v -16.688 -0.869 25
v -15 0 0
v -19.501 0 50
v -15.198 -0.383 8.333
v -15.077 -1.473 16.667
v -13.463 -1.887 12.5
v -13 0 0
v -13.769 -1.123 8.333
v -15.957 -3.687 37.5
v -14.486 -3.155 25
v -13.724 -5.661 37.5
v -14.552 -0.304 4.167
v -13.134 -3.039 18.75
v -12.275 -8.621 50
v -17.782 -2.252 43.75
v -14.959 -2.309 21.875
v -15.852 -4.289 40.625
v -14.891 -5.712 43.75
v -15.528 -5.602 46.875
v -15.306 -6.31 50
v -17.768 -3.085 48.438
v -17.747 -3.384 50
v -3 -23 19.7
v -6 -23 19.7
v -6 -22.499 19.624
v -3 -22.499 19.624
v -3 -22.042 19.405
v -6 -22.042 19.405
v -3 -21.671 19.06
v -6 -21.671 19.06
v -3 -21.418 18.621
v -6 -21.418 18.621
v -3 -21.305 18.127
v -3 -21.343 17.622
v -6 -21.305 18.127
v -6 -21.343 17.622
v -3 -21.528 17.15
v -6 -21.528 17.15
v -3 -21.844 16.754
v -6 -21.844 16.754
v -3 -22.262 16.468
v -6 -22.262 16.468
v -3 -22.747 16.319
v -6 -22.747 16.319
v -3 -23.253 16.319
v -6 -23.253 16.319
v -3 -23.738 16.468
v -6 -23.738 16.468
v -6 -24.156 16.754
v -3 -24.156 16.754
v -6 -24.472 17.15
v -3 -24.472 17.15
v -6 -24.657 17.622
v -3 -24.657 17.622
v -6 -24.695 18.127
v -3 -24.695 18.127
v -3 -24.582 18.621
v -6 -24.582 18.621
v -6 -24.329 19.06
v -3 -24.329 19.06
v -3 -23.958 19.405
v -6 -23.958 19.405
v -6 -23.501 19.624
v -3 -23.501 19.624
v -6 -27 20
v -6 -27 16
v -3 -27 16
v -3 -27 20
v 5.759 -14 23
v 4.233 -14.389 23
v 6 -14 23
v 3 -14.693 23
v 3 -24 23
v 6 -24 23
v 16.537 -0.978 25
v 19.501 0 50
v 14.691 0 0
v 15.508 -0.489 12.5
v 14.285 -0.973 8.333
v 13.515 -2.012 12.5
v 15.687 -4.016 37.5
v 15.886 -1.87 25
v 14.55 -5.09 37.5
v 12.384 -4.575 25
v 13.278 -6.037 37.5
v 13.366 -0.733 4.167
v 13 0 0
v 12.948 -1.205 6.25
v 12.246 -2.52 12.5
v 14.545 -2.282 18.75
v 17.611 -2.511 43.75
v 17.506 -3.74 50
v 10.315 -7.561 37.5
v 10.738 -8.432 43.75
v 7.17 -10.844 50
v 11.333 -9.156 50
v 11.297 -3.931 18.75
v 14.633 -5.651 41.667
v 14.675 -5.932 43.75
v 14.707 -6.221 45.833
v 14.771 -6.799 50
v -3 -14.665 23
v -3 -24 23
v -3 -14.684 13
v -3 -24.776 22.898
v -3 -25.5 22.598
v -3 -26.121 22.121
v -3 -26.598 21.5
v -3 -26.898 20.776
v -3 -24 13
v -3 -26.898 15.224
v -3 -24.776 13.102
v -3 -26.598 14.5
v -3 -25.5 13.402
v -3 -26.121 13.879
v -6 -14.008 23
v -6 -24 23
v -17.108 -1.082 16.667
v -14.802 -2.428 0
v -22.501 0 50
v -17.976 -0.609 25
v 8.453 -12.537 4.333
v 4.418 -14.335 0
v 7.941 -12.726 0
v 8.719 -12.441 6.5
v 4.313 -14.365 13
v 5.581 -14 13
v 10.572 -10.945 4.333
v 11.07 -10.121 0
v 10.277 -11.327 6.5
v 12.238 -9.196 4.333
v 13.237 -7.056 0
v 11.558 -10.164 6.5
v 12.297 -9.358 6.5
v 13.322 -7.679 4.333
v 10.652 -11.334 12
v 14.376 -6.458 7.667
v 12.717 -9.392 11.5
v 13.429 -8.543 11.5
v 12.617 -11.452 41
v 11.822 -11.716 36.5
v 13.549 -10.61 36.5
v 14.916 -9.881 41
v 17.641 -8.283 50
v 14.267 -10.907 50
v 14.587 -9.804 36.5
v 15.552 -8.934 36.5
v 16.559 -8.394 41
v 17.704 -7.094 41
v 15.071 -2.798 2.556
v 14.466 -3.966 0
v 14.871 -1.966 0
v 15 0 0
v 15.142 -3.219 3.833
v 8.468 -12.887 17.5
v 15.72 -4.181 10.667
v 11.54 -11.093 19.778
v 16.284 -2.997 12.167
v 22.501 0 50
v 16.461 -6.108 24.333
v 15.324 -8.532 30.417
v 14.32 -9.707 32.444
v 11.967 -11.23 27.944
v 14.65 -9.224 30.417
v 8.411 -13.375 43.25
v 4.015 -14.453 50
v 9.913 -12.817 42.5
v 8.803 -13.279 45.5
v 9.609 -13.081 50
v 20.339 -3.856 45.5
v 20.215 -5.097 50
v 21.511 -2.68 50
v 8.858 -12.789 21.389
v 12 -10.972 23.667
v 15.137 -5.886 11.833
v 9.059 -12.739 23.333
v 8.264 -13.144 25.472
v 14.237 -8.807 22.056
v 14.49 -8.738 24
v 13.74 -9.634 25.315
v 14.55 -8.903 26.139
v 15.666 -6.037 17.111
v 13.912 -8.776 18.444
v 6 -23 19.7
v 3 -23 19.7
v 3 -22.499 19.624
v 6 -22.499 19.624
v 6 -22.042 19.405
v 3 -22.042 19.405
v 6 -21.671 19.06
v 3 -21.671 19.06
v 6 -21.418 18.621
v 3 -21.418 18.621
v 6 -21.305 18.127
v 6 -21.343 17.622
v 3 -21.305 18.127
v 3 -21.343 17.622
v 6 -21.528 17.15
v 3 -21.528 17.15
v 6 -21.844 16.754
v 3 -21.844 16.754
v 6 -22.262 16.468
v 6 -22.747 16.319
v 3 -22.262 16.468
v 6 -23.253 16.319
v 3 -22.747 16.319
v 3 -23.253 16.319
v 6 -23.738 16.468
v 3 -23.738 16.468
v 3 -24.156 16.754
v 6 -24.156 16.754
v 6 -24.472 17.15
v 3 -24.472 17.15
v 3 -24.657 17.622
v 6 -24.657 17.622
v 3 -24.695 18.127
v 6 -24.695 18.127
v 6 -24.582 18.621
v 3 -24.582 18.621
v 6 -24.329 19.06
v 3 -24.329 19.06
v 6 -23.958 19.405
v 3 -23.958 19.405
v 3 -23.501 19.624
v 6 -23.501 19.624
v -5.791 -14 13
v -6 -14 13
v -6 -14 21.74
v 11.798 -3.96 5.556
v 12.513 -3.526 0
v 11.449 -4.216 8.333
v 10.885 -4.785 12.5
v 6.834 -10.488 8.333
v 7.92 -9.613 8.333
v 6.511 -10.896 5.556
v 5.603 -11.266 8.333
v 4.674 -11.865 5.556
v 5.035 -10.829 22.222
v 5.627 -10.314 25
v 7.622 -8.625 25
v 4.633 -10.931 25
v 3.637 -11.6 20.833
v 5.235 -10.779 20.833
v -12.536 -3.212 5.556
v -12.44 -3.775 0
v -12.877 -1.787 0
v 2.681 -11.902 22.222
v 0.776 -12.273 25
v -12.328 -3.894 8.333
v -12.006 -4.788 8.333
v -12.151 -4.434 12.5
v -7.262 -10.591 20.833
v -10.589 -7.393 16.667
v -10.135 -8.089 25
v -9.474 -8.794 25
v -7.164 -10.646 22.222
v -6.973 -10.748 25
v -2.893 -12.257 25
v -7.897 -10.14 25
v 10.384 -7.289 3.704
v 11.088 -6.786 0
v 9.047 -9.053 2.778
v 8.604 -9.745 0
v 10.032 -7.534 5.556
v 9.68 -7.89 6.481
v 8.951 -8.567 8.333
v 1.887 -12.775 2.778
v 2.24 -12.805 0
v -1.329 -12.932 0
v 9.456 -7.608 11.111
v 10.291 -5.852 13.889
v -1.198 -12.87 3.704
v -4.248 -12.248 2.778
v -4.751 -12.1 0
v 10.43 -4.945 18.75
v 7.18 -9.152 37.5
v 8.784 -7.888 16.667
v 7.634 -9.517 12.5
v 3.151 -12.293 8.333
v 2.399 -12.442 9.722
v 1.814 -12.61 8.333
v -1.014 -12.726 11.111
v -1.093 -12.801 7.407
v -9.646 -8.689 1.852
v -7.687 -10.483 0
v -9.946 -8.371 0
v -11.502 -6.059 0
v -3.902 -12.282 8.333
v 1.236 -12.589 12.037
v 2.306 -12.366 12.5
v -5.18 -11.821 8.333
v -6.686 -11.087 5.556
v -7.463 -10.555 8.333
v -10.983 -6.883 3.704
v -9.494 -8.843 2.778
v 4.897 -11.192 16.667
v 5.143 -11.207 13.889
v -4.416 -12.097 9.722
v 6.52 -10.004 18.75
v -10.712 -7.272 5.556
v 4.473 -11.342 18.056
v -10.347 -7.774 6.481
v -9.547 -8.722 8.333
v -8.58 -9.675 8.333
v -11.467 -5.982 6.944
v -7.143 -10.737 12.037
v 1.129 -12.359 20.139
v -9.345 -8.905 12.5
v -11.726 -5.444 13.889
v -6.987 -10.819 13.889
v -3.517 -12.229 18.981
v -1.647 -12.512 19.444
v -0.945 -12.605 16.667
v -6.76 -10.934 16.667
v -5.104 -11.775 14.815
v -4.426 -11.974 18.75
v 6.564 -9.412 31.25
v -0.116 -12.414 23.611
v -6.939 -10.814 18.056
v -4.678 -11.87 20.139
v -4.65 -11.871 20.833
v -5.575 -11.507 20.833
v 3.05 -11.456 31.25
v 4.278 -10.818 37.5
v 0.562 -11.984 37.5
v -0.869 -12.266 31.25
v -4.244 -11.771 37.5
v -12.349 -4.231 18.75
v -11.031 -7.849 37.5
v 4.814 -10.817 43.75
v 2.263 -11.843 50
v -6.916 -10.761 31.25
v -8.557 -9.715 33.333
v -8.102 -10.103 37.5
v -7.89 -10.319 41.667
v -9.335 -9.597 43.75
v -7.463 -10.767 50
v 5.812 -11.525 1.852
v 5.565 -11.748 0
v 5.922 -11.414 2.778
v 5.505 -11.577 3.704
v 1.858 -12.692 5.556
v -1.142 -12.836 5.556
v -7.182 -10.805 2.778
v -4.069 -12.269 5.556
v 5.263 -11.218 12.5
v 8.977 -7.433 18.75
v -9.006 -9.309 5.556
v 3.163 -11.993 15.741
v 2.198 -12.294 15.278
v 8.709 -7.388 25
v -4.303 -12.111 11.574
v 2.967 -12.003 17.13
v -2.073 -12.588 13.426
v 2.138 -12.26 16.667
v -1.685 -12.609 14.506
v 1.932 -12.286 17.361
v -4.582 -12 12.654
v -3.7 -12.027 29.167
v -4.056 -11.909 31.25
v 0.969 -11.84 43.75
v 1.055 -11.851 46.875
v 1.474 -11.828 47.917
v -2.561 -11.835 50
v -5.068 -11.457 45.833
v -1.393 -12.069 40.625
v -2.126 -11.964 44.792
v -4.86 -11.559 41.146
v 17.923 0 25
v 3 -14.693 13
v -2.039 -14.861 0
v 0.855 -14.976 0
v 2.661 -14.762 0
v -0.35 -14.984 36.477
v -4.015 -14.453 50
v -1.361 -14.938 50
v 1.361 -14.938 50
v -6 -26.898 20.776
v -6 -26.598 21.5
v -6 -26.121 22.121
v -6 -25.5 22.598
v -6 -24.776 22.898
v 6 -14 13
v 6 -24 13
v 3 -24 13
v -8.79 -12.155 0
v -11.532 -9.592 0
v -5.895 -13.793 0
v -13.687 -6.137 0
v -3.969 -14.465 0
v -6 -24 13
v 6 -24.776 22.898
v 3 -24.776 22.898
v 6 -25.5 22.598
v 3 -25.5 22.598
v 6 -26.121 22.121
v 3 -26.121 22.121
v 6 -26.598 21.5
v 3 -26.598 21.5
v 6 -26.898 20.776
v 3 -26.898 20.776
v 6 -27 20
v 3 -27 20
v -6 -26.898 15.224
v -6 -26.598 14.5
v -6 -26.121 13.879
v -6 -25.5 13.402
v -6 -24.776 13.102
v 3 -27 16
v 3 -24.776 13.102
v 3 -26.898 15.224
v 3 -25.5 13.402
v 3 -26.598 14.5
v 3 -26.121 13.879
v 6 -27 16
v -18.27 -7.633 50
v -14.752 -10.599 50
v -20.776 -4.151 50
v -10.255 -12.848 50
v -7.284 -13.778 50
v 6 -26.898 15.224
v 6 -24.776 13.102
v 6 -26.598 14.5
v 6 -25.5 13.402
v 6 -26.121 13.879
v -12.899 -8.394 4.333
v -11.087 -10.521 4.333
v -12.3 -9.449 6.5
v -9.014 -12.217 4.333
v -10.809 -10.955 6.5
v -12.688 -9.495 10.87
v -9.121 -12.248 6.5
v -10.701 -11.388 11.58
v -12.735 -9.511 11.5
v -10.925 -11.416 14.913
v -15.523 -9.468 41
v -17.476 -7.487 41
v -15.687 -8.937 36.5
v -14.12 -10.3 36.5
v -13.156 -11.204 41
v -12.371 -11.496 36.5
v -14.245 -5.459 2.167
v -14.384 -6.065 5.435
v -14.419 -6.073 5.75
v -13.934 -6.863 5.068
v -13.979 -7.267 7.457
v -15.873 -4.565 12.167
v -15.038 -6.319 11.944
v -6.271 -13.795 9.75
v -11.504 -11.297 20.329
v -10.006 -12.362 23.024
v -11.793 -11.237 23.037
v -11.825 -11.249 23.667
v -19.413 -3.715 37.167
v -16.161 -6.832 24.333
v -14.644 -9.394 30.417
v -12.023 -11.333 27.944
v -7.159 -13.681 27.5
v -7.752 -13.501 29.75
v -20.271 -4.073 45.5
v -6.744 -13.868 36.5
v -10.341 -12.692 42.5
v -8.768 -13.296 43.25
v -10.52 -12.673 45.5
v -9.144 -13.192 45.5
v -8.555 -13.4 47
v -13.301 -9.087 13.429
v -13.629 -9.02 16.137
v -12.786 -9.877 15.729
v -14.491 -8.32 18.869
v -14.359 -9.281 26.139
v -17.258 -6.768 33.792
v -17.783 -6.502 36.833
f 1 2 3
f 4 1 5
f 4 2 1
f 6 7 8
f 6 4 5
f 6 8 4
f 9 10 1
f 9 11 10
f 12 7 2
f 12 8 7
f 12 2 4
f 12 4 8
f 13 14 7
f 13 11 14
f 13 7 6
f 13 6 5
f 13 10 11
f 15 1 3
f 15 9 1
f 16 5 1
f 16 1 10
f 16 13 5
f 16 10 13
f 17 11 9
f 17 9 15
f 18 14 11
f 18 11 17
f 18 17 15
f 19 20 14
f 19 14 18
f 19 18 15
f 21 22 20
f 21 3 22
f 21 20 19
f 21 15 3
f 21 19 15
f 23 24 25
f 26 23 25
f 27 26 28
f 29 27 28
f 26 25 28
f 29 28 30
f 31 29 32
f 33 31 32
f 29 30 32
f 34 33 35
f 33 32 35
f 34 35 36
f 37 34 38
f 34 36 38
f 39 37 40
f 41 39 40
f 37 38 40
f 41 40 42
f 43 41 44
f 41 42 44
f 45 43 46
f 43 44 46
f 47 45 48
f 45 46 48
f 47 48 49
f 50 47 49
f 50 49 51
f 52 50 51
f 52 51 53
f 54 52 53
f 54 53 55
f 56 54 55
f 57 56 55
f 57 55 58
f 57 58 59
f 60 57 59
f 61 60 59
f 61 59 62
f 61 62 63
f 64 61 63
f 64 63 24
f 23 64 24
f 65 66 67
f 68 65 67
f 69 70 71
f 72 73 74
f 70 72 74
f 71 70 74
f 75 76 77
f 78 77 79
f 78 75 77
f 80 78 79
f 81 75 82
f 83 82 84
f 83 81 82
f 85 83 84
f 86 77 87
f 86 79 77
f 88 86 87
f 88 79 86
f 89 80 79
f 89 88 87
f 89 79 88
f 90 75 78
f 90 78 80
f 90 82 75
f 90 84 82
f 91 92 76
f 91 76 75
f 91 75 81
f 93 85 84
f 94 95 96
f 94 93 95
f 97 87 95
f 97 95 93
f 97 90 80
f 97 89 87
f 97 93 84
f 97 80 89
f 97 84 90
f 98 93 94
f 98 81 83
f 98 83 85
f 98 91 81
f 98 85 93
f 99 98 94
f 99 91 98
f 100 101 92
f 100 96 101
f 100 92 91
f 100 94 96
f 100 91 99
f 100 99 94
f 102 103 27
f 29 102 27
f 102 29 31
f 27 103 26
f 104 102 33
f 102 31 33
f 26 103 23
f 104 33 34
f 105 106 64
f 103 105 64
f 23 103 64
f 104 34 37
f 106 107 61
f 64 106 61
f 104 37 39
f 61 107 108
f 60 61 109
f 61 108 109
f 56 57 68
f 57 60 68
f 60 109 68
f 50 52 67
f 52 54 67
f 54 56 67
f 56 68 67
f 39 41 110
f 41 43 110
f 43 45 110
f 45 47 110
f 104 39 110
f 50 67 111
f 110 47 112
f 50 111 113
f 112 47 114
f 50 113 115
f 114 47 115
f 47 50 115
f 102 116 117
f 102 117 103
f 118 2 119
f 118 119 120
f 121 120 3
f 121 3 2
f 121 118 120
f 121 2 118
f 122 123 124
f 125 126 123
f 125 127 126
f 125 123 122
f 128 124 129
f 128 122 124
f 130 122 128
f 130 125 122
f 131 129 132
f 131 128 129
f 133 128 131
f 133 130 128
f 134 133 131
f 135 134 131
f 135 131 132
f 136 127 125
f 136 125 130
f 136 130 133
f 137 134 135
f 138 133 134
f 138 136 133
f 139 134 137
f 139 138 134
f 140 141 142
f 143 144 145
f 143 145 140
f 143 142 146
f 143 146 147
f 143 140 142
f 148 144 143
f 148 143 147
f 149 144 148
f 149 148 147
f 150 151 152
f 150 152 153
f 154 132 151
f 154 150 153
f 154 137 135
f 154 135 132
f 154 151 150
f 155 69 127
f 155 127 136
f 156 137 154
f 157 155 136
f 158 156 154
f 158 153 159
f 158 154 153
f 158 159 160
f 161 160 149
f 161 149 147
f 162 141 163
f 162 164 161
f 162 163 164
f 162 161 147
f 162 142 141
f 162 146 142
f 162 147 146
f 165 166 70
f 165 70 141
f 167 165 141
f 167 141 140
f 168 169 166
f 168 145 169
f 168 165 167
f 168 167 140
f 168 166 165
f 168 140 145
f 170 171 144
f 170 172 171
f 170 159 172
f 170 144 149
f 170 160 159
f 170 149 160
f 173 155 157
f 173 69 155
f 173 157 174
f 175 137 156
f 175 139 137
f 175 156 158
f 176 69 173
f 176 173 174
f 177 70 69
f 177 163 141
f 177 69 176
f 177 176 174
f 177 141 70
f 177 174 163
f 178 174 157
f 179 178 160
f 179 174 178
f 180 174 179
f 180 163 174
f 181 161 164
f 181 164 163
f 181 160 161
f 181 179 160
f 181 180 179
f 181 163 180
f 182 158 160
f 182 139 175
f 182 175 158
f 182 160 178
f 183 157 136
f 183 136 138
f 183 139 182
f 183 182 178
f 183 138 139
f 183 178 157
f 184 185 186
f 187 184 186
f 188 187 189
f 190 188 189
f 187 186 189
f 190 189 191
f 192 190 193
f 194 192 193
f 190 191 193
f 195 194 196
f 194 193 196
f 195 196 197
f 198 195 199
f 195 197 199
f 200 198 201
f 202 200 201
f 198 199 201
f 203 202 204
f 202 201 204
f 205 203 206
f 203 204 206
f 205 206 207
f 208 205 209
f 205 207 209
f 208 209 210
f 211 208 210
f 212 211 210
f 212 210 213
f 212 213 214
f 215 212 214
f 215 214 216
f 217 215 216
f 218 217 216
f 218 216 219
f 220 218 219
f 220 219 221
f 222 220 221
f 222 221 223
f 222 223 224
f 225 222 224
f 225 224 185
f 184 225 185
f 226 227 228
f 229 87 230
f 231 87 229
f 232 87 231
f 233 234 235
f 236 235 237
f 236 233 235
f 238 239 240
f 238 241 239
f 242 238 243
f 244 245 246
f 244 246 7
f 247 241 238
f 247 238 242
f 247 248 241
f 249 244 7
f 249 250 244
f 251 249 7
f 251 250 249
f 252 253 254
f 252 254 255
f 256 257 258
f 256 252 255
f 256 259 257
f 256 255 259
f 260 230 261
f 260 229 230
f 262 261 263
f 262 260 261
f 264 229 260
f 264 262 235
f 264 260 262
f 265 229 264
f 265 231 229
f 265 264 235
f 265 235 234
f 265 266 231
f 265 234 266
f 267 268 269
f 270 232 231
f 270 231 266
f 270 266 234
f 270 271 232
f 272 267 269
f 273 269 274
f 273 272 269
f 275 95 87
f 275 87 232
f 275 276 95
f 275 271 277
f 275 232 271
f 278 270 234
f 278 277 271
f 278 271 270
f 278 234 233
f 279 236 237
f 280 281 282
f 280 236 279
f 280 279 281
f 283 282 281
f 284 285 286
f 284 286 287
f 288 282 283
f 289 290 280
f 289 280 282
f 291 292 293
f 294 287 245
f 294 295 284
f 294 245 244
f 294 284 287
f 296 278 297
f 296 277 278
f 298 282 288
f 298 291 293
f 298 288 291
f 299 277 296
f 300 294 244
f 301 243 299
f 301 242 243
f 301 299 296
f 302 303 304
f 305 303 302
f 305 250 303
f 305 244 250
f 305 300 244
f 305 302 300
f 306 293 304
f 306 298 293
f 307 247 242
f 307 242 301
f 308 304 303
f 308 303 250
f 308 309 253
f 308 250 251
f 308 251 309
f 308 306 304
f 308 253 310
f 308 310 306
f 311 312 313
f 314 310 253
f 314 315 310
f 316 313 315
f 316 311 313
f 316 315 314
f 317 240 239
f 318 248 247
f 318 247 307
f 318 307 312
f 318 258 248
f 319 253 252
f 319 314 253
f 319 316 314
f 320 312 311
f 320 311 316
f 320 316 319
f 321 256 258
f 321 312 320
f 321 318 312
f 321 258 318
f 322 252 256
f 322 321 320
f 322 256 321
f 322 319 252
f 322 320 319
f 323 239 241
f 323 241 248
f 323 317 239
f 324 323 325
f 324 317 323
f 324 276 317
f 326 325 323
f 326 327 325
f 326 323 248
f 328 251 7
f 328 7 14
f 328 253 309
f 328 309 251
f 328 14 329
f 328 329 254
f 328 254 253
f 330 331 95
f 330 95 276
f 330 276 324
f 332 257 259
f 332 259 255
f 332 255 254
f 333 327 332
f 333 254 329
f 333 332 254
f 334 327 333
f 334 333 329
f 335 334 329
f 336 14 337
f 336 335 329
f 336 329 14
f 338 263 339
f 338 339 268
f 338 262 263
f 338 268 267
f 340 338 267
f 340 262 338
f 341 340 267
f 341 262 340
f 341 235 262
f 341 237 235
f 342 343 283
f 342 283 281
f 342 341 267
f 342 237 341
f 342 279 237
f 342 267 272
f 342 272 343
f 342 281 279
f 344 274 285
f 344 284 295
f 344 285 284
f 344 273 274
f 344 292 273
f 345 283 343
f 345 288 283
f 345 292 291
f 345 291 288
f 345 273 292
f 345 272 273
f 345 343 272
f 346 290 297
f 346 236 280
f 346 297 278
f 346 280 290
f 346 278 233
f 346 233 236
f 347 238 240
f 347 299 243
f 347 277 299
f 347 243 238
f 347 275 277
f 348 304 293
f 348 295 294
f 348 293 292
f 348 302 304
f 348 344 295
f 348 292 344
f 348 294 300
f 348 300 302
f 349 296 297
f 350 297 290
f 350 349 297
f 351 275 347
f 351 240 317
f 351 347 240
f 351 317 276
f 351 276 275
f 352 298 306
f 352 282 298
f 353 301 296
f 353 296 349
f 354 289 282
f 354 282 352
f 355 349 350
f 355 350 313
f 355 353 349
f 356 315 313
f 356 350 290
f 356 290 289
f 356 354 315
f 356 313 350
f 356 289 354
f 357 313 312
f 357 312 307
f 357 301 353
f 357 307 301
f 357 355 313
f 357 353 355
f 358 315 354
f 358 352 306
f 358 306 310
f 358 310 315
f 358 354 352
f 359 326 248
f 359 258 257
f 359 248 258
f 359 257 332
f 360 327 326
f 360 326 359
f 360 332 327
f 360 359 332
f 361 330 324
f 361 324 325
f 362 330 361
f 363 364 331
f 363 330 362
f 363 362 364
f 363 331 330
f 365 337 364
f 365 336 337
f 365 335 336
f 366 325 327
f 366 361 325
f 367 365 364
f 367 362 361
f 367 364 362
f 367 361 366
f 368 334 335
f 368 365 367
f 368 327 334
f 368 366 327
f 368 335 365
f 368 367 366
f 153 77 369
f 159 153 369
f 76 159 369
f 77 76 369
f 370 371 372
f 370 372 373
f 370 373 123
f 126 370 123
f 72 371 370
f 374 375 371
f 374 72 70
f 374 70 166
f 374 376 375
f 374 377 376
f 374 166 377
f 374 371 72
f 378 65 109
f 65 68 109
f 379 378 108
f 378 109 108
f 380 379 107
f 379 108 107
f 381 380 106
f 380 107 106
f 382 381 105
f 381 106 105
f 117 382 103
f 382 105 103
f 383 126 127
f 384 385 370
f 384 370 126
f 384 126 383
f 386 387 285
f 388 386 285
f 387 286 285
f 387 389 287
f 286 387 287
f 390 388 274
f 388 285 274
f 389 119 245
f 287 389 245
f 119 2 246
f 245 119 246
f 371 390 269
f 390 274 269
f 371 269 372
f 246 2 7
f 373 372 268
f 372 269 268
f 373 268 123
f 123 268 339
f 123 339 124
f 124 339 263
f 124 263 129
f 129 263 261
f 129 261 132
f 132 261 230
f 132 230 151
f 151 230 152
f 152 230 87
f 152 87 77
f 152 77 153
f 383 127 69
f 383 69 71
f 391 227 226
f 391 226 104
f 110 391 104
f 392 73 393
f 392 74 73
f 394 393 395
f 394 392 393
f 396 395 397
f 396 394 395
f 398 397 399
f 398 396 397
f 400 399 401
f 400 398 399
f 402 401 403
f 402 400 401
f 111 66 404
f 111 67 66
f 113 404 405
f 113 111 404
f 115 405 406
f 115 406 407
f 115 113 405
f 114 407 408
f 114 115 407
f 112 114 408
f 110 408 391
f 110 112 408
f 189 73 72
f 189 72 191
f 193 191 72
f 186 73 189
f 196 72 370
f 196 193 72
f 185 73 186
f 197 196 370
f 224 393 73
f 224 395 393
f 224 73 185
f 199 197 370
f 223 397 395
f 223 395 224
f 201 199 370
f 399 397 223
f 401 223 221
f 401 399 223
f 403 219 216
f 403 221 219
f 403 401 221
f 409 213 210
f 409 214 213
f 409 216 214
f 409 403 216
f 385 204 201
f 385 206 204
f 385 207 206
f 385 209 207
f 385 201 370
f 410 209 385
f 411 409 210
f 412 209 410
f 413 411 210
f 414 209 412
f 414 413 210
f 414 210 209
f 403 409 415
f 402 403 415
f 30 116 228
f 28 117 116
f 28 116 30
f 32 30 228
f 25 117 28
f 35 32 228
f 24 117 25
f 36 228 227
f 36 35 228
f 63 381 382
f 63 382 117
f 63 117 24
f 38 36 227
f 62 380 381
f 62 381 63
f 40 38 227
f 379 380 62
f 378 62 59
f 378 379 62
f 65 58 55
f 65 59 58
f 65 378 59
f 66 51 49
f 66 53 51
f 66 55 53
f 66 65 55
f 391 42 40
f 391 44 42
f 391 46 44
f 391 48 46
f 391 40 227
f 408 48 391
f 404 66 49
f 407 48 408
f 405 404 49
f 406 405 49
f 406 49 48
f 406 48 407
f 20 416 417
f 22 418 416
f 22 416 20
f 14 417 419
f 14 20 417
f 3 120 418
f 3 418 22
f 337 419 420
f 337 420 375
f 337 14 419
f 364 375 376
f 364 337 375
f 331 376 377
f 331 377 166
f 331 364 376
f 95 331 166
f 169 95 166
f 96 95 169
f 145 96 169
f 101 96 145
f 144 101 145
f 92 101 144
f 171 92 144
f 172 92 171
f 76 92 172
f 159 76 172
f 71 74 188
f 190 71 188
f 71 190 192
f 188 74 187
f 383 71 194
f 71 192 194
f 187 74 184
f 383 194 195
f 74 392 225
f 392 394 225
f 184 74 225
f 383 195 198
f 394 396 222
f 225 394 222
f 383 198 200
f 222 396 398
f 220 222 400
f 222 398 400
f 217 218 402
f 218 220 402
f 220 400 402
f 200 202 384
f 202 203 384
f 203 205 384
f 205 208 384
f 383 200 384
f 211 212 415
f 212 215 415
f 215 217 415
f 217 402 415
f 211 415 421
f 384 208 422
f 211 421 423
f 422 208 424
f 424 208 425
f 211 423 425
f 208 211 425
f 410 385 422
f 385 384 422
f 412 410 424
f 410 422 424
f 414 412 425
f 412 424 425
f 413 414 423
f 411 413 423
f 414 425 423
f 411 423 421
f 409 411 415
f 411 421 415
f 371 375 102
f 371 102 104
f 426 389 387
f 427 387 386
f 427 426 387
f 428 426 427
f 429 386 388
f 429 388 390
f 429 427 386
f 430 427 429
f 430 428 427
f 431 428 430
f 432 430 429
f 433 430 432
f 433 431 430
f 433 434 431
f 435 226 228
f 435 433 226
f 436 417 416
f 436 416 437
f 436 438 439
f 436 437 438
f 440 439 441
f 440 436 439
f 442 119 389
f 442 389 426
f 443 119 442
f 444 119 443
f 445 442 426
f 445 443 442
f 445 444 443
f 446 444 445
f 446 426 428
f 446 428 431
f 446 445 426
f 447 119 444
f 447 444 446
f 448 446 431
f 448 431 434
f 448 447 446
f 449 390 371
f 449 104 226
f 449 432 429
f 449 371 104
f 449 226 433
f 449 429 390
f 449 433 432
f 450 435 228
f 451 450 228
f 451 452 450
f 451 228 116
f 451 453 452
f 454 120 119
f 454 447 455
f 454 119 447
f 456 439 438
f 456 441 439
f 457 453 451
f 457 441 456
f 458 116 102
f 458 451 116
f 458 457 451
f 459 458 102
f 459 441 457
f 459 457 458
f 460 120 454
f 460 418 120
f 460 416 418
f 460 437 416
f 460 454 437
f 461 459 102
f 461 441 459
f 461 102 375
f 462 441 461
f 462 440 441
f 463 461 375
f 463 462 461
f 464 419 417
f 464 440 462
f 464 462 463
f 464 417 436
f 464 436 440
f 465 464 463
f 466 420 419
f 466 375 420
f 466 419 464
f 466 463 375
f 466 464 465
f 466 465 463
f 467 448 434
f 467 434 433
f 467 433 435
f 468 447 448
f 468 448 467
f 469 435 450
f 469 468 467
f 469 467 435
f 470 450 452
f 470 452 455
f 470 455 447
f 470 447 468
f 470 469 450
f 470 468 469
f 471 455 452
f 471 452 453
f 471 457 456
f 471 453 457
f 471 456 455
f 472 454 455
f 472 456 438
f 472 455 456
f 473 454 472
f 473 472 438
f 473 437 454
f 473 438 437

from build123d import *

# Parameters (mm, degrees)
Y_KSEKLIK_EKSTR_ZYON1_DEPTH      = 1
Y_KSEKLIK_EKSTR_ZYON1_DEPTH_BACK = 12
IZIM3_W                          = 3
IZIM3_H                          = 10
RADYUS1_R                        = 3
IZIM4_R                          = 1.7
KES_EKSTR_ZYON1_DEPTH            = 31


with BuildPart() as part:
    # Loft1: read off the stored shape, not the designer's step
    # Loft1: loft between two sections, ruled curve by curve
    loft1_from = [
        Edge.make_bspline([(-13, 0, 0), (-13.209224756, 0, 0), (-13.54255809, 0, 0), (-13.875891423, 0, 0), (-14.101661333, 0, 0), (-14.434994666, 0, 0), (-14.768328, 0, 0), (-15, 0, 0)], [0, 0, 0, 0, 0.313837134, 0.5, 0.5, 0.652492, 1, 1, 1, 1], 3),
        Edge.make_bspline([(-15, 0, 0), (-15, -0.406070992, 0), (-14.983401695, -0.812808246, 0), (-14.917335296, -1.623604412, 0), (-14.867867201, -2.027663325, 0), (-14.80212762, -2.428377634, 0)], [0, 0, 0, 0, 0.5, 0.5, 1, 1, 1, 1], 3),
        Edge.make_bspline([(13, 0, 0), (13, -0.541666667, 0), (12.966403007, -1.117524212, 0), (12.803508497, -2.333803221, 0), (12.674133333, -2.9744, 0), (12.285866667, -4.3056, 0), (12.026764297, -4.996380928, 0), (11.344022219, -6.396877499, 0), (10.92, -7.106666667, 0), (9.88, -8.493333333, 0), (9.263526615, -9.170013136, 0), (7.832363796, -10.41902796, 0), (7.017301038, -10.99077278, 0), (5.21799308, -11.950403691, 0), (4.233846154, -12.337435897, 0), (2.166153846, -12.862564103, 0), (1.083333333, -13, 0), (-1.083333333, -13, 0), (-2.166153846, -12.862564103, 0), (-4.233846154, -12.337435897, 0), (-5.21799308, -11.950403691, 0), (-7.017301038, -10.99077278, 0), (-7.832363796, -10.41902796, 0), (-9.263526615, -9.170013136, 0), (-9.88, -8.493333333, 0), (-10.92, -7.106666667, 0), (-11.344022219, -6.396877499, 0), (-12.026764297, -4.996380928, 0), (-12.285866667, -4.3056, 0), (-12.674133333, -2.9744, 0), (-12.803508497, -2.333803221, 0), (-12.966403007, -1.117524212, 0), (-13, -0.541666667, 0), (-13, 0, 0)], [0, 0, 0, 0, 0.0625, 0.0625, 0.125, 0.125, 0.1875, 0.1875, 0.25, 0.25, 0.3125, 0.3125, 0.375, 0.375, 0.4375, 0.4375, 0.5, 0.5, 0.5625, 0.5625, 0.625, 0.625, 0.6875, 0.6875, 0.75, 0.75, 0.8125, 0.8125, 0.875, 0.875, 0.9375, 0.9375, 1, 1, 1, 1], 3),
        Edge.make_bspline([(-14.80212762, -2.428377634, 0), (-14.681938937, -3.16098536, 0), (-14.504127476, -3.902792163, 0), (-14.02427913, -5.377833707, 0), (-13.722166884, -6.11096882, 0), (-12.993207628, -7.537795397, 0), (-12.566336555, -8.231351462, 0), (-11.597614897, -9.547946899, 0), (-11.055808561, -10.170847244, 0), (-9.876980677, -11.319111684, 0), (-9.240065749, -11.844371923, 0), (-7.898482942, -12.778181737, 0), (-7.193955206, -13.18669073, 0), (-5.748476154, -13.877925848, 0), (-5.007659558, -14.160679583, 0), (-3.520524561, -14.601623448, 0), (-2.774303774, -14.75989153, 0), (-2.038792236, -14.860798304, 0)], [0, 0, 0, 0, 0.125, 0.125, 0.25, 0.25, 0.375, 0.375, 0.5, 0.5, 0.625, 0.625, 0.75, 0.75, 0.875, 0.875, 1, 1, 1, 1], 3),
        Edge.make_bspline([(-2.038792236, -14.860798304, 0), (0.134662487, -15.158980307, 0), (2.321229161, -14.980811498, 0), (4.417739539, -14.33469837, 0)], [0, 0, 0, 0, 1, 1, 1, 1], 3, [1, 0.984272414, 0.984272414, 1]),
        Edge.make_bspline([(4.417739539, -14.33469837, 0), (5.127212599, -14.116049389, 0), (5.83796731, -13.839062041, 0), (7.234099562, -13.16317986, 0), (7.919368159, -12.764223905, 0), (9.233873859, -11.848095943, 0), (9.86297355, -11.3309185, 0), (11.035682686, -10.192235719, 0), (11.579160408, -9.570793115, 0), (12.556543149, -8.246833378, 0), (12.990359766, -7.544435992, 0), (13.733156479, -6.088380279, 0), (14.042115417, -5.334866309, 0), (14.53046703, -3.808849147, 0), (14.70990537, -3.036475671, 0), (14.944626607, -1.503208594, 0), (15, -0.742401104, 0), (15, 0, 0)], [0, 0, 0, 0, 0.125, 0.125, 0.25, 0.25, 0.375, 0.375, 0.5, 0.5, 0.625, 0.625, 0.75, 0.75, 0.875, 0.875, 1, 1, 1, 1], 3),
        Edge.make_bspline([(14.691051451, 0, 0), (14.409209542, 0, 0), (14.127367634, 0, 0), (13.563683817, 0, 0), (13.281841908, 0, 0), (13, 0, 0)], [0, 0, 0, 0, 0.5, 0.5, 1, 1, 1, 1], 3),
        Edge.make_line((14.691051451, 0, 0), (15, 0, 0)),
    ]
    loft1_to = [
        Edge.make_bspline([(-12.275322713, -8.62069906, 50), (-13.30009489, -7.9994122, 50), (-14.838773196, -6.851542234, 50), (-16.153887151, -5.461933248, 50), (-16.982212381, -4.468717424, 50), (-18.129692881, -2.939391702, 50), (-19.010068808, -1.232828152, 50), (-19.501011098, 0, 50)], [0, 0, 0, 0, 0.313837134, 0.5, 0.5, 0.652492, 1, 1, 1, 1], 3),
        Edge.make_bspline([(-19.501011098, 0, 50), (-20.001011098, 0, 50), (-20.501011098, 0, 50), (-21.501011098, 0, 50), (-22.001011098, 0, 50), (-22.501011098, 0, 50)], [0, 0, 0, 0, 0.5, 0.5, 1, 1, 1, 1], 3),
        Edge.make_bspline([(7.170134264, -10.843854234, 50), (6.75061217, -10.971235531, 50), (6.331990602, -11.087760763, 50), (5.496548516, -11.2990991, 50), (5.079727998, -11.393912204, 50), (4.247888014, -11.561826283, 50), (3.832868547, -11.634927259, 50), (3.004630665, -11.75941708, 50), (2.591412249, -11.810805927, 50), (1.766776468, -11.891871491, 50), (1.355359103, -11.921548209, 50), (0.534325424, -11.959189516, 50), (0.12470911, -11.967154105, 50), (-0.692722467, -11.961371154, 50), (-1.100537731, -11.947623615, 50), (-1.914367207, -11.898416407, 50), (-2.320381419, -11.862956738, 50), (-3.130608793, -11.770325273, 50), (-3.534821955, -11.713153476, 50), (-4.341447227, -11.577097753, 50), (-4.743859338, -11.498213827, 50), (-5.546882508, -11.318733846, 50), (-5.947493568, -11.218137792, 50), (-6.746914637, -10.995233554, 50), (-7.145724646, -10.87292537, 50), (-7.941543614, -10.606596875, 50), (-8.338552572, -10.462576563, 50), (-9.130769437, -10.15282381, 50), (-9.525977345, -9.987091369, 50), (-10.314592108, -9.633914359, 50), (-10.707998965, -9.446469789, 50), (-11.493011627, -9.049868521, 50), (-11.884617433, -8.840711823, 50), (-12.275322713, -8.62069906, 50)], [0, 0, 0, 0, 0.0625, 0.0625, 0.125, 0.125, 0.1875, 0.1875, 0.25, 0.25, 0.3125, 0.3125, 0.375, 0.375, 0.4375, 0.4375, 0.5, 0.5, 0.5625, 0.5625, 0.625, 0.625, 0.6875, 0.6875, 0.75, 0.75, 0.8125, 0.8125, 0.875, 0.875, 0.9375, 0.9375, 1, 1, 1, 1], 3),
        Edge.make_bspline([(-22.501011098, 0, 50), (-22.201916292, -1.005484405, 50), (-21.843929165, -1.960557007, 50), (-21.010170267, -3.769878608, 50), (-20.534398496, -4.624127606, 50), (-19.465070311, -6.231801999, 50), (-18.871513898, -6.985227394, 50), (-17.566616427, -8.391254578, 50), (-16.85527537, -9.043856368, 50), (-15.314808613, -10.248236345, 50), (-14.485682914, -10.800014531, 50), (-12.709646871, -11.802747299, 50), (-11.762736528, -12.253701882, 50), (-9.751131199, -13.054787442, 50), (-8.686436212, -13.40491842, 50), (-6.439261597, -14.004356772, 50), (-5.256781968, -14.253664146, 50), (-4.015410017, -14.452559718, 50)], [0, 0, 0, 0, 0.125, 0.125, 0.25, 0.25, 0.375, 0.375, 0.5, 0.5, 0.625, 0.625, 0.75, 0.75, 0.875, 0.875, 1, 1, 1, 1], 3),
        Edge.make_bspline([(-4.015410017, -14.452559718, 50), (-1.371847999, -15.187030678, 50), (1.371847999, -15.187030678, 50), (4.015410017, -14.452559718, 50)], [0, 0, 0, 0, 1, 1, 1, 1], 3, [1, 0.975669321, 0.975669321, 1]),
        Edge.make_bspline([(4.015410017, -14.452559718, 50), (5.256781968, -14.253664146, 50), (6.439261597, -14.004356772, 50), (8.686436212, -13.40491842, 50), (9.751131199, -13.054787442, 50), (11.762736528, -12.253701882, 50), (12.709646871, -11.802747299, 50), (14.485682914, -10.800014531, 50), (15.314808613, -10.248236345, 50), (16.85527537, -9.043856368, 50), (17.566616427, -8.391254578, 50), (18.871513898, -6.985227394, 50), (19.465070311, -6.231801999, 50), (20.534398496, -4.624127606, 50), (21.010170267, -3.769878608, 50), (21.843929165, -1.960557007, 50), (22.201916292, -1.005484405, 50), (22.501011098, 0, 50)], [0, 0, 0, 0, 0.125, 0.125, 0.25, 0.25, 0.375, 0.375, 0.5, 0.5, 0.625, 0.625, 0.75, 0.75, 0.875, 0.875, 1, 1, 1, 1], 3),
        Edge.make_bspline([(19.501011098, 0, 50), (18.422591042, -2.708071054, 50), (16.855807944, -4.965761101, 50), (12.745515666, -8.580379179, 50), (10.202006485, -9.93730721, 50), (7.170134264, -10.843854234, 50)], [0, 0, 0, 0, 0.5, 0.5, 1, 1, 1, 1], 3),
        Edge.make_line((19.501011098, 0, 50), (22.501011098, 0, 50)),
    ]
    loft1 = Solid(Shell([*[Face.make_surface_from_curves(loft1_from[k], loft1_to[k]) for k in range(8)], Face(Wire(loft1_from)), Face(Wire(loft1_to))]))
    add(loft1)

    # Çizim3 → Yükseklik-Ekstrüzyon1 (add, two sides: drawn at the far end of the back side and taken through both)
    with BuildSketch(Plane(origin=(0, -15, 0), x_dir=(1, 0, 0), z_dir=(0, 1, 0)).offset(-Y_KSEKLIK_EKSTR_ZYON1_DEPTH_BACK)):
        with Locations((-4.5, -18)):
            Rectangle(IZIM3_W, IZIM3_H)
        with Locations((4.5, -18)):
            Rectangle(IZIM3_W, IZIM3_H)
    extrude(amount=Y_KSEKLIK_EKSTR_ZYON1_DEPTH + Y_KSEKLIK_EKSTR_ZYON1_DEPTH_BACK)

    # Radyus1
    radyus1_edges = [part.edges().sort_by_distance(p)[0] for p in [
        (4.5, -27, 23),
        (4.5, -27, 13),
        (-4.5, -27, 13),
        (-4.5, -27, 23),
    ]]
    fillet(radyus1_edges, radius=RADYUS1_R)

    # Çizim4 → Kes-Ekstrüzyon1 (cut)
    with BuildSketch(Plane.ZY.offset(6)):
        with Locations((18, -23)):
            Circle(IZIM4_R)
    extrude(amount=-KES_EKSTR_ZYON1_DEPTH, mode=Mode.SUBTRACT)


solid = part.part
